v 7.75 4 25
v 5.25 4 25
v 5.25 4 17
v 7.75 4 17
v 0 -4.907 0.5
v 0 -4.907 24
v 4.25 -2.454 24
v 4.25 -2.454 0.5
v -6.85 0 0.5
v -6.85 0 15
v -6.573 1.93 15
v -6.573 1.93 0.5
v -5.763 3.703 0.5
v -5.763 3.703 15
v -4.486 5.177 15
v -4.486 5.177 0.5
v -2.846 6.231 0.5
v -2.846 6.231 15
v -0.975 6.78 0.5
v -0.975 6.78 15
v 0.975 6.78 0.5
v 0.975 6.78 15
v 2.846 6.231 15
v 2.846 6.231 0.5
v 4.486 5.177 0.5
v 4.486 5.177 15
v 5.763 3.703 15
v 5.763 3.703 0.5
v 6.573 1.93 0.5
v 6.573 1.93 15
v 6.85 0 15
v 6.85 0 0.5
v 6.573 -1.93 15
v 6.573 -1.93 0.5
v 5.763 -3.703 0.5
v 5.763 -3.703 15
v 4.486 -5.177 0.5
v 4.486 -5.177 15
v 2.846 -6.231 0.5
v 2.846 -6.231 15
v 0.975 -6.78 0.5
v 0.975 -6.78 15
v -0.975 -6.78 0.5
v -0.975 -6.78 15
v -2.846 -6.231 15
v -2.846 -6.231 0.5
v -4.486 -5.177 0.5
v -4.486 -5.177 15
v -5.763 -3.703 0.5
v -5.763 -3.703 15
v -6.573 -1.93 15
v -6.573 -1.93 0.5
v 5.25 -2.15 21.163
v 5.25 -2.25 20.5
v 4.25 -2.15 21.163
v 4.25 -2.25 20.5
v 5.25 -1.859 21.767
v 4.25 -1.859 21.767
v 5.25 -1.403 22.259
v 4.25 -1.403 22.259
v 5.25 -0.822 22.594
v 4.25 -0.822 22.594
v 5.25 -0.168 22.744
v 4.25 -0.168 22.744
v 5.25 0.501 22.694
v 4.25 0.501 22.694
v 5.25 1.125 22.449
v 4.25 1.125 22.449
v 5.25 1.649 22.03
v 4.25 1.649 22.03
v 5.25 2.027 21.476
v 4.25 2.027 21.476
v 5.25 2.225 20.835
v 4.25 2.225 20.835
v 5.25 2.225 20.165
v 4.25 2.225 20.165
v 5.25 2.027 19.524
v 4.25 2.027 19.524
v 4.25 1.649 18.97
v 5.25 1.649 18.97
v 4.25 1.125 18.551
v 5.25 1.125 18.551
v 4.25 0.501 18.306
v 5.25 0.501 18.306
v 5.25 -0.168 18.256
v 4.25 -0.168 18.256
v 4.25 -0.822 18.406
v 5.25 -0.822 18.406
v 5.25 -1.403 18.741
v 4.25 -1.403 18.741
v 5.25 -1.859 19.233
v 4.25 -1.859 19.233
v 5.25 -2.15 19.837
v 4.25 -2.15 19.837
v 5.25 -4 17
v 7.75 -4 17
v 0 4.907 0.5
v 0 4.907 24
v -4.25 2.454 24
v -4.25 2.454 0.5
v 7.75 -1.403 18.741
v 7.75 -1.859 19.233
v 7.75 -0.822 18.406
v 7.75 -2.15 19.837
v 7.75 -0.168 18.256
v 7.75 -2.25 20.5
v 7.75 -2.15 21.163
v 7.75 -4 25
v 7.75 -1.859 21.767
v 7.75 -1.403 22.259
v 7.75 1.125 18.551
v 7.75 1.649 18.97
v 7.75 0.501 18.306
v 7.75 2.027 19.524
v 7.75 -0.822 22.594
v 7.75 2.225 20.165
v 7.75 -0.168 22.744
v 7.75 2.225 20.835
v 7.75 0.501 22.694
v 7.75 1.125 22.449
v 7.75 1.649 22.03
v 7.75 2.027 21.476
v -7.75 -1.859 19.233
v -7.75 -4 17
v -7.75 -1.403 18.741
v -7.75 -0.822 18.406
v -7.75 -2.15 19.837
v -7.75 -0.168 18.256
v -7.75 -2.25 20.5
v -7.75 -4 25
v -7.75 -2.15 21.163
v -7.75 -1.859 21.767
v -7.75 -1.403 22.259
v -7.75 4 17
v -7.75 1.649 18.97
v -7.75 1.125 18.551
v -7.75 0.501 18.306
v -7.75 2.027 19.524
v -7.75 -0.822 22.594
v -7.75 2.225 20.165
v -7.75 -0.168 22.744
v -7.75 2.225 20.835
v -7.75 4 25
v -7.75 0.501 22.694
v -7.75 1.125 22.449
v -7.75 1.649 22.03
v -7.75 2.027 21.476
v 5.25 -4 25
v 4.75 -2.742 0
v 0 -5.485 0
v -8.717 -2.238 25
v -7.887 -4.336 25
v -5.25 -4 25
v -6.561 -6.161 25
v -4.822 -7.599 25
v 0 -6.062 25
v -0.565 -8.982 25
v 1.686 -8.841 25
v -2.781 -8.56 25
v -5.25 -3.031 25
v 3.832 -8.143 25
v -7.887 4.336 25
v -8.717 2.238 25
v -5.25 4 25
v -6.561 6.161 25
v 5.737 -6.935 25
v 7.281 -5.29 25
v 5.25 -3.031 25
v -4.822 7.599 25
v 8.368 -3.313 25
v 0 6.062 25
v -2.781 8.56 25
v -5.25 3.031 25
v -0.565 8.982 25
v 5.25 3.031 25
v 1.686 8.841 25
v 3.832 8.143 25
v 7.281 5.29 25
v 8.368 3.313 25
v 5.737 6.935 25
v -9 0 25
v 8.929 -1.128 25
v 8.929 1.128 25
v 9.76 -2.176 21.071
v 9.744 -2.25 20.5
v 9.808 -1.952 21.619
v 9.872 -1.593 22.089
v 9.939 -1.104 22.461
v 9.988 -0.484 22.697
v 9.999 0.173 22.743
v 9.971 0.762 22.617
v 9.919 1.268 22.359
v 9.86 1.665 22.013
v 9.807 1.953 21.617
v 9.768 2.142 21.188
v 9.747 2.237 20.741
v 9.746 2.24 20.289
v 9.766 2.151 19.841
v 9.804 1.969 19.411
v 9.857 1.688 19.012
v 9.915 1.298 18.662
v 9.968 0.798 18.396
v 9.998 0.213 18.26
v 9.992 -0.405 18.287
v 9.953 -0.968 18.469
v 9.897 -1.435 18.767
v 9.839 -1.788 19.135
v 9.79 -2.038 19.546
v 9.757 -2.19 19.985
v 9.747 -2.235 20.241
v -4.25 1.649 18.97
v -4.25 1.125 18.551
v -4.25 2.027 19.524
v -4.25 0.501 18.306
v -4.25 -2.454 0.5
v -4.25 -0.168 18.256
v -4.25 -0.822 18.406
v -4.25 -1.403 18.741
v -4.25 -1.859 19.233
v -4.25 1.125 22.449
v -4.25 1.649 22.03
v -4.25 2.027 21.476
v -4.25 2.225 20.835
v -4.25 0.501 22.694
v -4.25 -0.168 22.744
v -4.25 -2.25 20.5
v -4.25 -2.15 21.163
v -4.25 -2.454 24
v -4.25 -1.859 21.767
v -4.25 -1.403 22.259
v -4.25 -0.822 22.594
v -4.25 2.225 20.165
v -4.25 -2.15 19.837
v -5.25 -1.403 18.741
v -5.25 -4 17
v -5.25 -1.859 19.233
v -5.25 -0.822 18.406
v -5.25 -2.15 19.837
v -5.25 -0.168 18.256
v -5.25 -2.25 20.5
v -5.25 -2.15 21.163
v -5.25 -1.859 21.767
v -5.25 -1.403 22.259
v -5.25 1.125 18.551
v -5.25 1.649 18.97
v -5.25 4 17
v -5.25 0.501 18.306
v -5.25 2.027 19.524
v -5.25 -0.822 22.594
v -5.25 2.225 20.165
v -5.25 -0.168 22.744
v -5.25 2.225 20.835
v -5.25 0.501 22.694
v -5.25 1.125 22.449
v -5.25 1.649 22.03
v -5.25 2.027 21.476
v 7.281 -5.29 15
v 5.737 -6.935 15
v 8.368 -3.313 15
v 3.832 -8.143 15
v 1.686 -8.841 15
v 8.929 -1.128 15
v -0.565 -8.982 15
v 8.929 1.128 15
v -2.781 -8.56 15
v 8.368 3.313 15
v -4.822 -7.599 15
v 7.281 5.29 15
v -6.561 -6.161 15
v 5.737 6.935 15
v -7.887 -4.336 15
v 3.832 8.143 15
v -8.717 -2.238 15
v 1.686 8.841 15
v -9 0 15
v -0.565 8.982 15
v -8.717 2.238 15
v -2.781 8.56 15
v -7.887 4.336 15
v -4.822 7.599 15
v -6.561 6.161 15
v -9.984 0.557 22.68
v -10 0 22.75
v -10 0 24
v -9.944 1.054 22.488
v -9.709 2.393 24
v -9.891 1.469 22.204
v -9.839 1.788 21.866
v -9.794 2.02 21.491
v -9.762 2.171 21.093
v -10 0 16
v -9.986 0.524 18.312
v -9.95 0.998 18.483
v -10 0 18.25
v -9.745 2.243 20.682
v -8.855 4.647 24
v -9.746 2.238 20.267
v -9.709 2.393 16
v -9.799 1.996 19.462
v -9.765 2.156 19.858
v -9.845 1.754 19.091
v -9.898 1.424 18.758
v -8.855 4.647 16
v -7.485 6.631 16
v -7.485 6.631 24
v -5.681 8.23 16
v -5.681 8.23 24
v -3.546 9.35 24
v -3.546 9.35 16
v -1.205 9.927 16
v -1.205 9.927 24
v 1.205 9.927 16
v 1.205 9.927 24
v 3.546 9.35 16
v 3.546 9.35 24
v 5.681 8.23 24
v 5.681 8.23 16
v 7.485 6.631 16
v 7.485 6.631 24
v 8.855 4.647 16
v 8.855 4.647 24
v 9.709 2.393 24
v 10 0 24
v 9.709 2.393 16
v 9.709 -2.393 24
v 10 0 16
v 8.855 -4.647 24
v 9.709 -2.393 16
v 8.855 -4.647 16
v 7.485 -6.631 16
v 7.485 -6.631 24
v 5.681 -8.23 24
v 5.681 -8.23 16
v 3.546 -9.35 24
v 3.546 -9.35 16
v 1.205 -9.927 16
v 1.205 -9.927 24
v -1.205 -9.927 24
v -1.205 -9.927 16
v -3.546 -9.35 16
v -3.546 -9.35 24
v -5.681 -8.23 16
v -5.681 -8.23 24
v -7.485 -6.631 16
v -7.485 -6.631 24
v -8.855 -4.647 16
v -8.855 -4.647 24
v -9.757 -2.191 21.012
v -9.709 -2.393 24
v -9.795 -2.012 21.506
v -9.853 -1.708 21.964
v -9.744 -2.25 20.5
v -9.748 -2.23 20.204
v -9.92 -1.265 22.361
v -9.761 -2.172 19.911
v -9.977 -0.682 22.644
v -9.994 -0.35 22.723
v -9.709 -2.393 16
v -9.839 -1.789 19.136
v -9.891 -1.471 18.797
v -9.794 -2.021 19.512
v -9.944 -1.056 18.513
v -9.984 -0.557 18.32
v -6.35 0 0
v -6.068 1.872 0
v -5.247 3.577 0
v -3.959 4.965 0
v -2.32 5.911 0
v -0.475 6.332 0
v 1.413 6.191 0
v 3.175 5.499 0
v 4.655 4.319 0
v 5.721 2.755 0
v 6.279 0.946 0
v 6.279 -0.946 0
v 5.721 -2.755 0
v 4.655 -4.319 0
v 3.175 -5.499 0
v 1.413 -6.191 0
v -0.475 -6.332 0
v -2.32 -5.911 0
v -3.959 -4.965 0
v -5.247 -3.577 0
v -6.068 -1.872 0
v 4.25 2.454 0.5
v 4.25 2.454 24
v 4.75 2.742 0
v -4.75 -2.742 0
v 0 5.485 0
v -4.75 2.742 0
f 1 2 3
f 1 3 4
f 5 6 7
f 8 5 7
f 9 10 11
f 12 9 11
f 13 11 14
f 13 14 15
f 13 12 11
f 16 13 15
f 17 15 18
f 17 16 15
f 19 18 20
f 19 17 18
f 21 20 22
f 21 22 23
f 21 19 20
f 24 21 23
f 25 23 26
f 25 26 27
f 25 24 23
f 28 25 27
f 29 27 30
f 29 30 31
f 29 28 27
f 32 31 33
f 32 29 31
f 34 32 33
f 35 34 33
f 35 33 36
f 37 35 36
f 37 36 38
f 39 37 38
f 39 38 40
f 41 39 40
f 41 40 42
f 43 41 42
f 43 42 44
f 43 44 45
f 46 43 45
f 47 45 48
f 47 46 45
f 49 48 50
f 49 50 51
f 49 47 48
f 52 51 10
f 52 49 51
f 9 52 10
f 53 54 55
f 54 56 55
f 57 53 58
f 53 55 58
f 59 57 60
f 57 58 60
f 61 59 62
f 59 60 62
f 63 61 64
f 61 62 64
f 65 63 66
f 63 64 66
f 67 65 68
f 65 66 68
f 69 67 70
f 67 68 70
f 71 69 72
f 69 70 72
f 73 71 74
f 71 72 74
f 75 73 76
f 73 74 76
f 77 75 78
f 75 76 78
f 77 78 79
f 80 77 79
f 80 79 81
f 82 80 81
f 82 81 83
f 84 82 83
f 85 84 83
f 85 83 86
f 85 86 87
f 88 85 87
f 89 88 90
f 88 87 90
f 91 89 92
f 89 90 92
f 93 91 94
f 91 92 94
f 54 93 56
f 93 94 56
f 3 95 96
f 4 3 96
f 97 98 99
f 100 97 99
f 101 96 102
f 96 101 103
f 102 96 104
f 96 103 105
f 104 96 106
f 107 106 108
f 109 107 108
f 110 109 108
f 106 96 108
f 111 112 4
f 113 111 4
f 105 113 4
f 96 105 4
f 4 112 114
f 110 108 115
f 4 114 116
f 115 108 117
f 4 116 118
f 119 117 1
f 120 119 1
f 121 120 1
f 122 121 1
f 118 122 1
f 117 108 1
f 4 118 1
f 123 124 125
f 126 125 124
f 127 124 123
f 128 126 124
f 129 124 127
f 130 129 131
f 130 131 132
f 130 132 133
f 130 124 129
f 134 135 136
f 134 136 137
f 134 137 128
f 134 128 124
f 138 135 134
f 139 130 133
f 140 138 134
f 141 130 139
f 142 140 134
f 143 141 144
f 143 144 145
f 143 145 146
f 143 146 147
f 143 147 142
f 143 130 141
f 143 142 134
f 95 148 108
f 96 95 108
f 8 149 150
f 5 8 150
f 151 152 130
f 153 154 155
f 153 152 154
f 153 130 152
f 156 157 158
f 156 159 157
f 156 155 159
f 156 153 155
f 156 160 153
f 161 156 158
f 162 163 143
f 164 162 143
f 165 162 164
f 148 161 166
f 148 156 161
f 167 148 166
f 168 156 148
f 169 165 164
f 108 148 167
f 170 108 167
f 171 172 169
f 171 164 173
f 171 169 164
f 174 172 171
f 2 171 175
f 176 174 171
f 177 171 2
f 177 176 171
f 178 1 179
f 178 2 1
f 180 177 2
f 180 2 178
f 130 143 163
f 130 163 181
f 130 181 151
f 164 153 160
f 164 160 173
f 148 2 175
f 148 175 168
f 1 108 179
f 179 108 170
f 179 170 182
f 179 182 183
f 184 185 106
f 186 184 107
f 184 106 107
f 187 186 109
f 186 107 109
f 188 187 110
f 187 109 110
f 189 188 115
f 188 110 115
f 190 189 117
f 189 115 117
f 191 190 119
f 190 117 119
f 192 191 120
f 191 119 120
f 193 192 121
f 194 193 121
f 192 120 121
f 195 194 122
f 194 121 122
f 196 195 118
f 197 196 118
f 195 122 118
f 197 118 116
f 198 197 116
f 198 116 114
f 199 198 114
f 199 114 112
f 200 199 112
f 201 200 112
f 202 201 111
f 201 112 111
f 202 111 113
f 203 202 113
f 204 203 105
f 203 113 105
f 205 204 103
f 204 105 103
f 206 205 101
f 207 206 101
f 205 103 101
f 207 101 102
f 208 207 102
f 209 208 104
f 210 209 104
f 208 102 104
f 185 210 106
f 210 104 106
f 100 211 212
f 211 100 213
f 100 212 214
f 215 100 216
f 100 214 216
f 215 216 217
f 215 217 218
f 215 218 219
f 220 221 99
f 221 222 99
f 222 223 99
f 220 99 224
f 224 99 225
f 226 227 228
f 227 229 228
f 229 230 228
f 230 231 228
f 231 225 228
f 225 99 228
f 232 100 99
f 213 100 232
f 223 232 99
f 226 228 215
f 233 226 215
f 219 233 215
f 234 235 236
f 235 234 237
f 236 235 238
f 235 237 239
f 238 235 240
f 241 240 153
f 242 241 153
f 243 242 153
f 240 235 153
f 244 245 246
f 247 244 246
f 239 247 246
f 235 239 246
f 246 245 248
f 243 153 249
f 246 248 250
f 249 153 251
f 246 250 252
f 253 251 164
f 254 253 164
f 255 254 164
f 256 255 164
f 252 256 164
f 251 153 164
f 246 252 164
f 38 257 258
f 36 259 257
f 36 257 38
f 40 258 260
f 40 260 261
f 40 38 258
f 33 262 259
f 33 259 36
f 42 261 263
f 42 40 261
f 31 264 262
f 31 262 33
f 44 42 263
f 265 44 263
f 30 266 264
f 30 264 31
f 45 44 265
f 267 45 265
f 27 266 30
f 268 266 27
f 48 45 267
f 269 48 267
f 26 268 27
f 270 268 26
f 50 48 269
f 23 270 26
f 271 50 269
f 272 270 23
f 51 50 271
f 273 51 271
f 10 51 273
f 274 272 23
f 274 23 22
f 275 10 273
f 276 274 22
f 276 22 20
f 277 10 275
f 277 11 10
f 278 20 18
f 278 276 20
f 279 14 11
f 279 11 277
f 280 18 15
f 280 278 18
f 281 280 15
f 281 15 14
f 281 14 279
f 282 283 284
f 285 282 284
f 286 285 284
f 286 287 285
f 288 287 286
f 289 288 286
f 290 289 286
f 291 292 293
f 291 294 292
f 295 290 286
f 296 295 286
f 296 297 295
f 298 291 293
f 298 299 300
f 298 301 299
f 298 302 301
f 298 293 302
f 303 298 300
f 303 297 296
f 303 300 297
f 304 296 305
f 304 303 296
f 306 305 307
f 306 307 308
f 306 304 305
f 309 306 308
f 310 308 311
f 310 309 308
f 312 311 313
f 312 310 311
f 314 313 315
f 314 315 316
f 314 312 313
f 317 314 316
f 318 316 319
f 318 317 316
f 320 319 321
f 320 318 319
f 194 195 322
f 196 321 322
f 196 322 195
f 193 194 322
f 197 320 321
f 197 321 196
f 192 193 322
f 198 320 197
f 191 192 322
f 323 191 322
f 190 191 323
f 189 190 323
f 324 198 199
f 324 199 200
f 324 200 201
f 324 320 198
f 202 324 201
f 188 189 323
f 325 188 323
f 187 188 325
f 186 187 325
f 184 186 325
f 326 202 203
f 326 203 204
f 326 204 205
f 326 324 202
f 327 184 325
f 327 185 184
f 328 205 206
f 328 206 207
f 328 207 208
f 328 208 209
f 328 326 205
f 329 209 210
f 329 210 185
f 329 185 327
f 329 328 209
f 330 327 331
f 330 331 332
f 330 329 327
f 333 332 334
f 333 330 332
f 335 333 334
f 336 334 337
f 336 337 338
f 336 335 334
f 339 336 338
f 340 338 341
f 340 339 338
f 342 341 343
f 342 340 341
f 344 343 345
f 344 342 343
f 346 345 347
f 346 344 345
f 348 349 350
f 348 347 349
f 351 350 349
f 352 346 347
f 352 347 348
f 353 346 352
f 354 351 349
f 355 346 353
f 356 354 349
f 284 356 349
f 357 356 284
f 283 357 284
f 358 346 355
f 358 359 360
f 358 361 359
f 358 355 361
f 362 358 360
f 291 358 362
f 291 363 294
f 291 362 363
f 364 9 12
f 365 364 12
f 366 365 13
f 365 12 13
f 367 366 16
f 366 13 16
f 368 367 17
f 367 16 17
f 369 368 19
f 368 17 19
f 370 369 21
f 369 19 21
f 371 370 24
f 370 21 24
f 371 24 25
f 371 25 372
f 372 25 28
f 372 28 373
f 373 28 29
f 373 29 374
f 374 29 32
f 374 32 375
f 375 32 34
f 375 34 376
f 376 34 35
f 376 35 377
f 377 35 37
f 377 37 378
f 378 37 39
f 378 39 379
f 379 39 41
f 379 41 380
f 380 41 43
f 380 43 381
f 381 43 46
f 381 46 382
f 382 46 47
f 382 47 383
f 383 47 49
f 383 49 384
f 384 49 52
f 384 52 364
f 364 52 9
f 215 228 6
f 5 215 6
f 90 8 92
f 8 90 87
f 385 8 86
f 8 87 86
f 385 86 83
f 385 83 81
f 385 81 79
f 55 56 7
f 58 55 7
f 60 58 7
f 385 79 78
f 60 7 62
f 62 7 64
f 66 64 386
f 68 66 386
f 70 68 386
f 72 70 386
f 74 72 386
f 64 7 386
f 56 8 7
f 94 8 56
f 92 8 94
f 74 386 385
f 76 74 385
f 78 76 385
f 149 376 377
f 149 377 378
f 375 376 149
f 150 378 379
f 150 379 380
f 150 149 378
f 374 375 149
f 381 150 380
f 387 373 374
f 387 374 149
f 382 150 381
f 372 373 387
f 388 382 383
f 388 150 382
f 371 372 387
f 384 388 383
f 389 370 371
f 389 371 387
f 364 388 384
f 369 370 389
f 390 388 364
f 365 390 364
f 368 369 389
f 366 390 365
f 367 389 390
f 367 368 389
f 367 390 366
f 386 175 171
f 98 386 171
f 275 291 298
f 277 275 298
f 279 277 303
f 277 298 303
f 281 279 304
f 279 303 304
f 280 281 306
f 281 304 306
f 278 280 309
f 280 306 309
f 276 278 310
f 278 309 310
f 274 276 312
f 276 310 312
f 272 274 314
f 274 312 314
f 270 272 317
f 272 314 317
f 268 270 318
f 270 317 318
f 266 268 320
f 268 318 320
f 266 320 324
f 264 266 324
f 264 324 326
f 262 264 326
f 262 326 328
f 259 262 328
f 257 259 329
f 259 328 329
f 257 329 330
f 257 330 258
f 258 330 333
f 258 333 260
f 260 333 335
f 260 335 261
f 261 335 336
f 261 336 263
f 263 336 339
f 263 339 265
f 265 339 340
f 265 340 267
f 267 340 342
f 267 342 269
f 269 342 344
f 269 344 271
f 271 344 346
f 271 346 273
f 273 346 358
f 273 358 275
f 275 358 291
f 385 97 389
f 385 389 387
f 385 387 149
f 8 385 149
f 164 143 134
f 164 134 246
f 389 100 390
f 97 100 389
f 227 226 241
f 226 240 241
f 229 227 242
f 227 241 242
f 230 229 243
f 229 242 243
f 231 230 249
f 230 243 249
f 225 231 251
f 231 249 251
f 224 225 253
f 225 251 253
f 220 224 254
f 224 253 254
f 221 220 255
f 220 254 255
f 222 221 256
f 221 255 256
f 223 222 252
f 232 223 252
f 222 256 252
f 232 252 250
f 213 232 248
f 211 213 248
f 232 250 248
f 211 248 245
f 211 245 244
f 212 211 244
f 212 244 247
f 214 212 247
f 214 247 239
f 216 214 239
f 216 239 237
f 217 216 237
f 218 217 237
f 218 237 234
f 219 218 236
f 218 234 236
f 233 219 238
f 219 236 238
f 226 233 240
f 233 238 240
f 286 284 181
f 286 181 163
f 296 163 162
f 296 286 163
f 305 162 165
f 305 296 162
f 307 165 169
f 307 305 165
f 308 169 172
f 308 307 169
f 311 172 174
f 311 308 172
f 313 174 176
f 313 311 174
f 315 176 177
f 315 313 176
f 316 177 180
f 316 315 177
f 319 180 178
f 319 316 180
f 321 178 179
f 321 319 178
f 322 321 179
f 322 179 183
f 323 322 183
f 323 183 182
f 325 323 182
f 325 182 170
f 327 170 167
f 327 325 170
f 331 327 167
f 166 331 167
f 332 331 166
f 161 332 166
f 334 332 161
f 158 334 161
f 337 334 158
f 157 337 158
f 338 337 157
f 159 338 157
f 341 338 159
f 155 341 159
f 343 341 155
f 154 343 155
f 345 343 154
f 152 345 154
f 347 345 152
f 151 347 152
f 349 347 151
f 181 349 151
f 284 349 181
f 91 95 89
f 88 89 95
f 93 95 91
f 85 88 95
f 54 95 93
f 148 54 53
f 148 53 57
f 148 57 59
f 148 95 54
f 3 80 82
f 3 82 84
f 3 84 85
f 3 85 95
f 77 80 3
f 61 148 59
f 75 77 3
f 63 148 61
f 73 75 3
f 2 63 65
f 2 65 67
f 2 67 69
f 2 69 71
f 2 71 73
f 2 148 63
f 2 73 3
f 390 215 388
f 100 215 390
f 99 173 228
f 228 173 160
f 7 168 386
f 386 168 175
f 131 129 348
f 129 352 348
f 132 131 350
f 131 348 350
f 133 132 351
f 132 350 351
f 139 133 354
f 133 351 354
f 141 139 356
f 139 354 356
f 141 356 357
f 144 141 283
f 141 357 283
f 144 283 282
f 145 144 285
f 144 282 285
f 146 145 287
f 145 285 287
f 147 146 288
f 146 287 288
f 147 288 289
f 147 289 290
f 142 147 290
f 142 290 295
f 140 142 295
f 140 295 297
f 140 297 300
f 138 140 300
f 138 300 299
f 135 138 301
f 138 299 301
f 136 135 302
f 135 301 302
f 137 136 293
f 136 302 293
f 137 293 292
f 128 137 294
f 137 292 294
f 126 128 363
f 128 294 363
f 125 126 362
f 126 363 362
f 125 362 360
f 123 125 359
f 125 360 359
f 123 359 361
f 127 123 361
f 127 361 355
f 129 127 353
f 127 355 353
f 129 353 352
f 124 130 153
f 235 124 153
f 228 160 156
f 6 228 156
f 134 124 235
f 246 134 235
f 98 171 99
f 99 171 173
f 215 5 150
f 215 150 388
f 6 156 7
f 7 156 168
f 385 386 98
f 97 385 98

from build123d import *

# Parameters (mm, degrees)
F3_DEPTH = 25.001
F2_W     = 2.5
F2_H     = 8
F4_DEPTH = 8
F5_R     = 2.25
F6_DEPTH = 25
F7_SIZE  = 0.99999
F8_SIZE  = 0.5


# Not quite as in the source:
# - a fillet or chamfer is up to 0.001 mm smaller than in the source, because OpenCascade refuses the exact size


with BuildPart() as f1:
    # F0 (on Front) → F1 (revolve)
    with BuildSketch(Plane.XZ):
        Polygon((-6.85, 0), (0, 0), (0, 25), (-10, 25), (-10, 15), (-6.85, 15), align=None)
    revolve(axis=Axis((0, 0, 12.5), (0, 0, -1)))

    # F2 (on face) → F3 (cut, through all)
    with BuildSketch(Plane.XY.offset(25)):
        Polygon((4.25, -2.4537386441), (4.25, 2.4537386441), (0, 4.9074772881), (-4.25, 2.4537386441), (-4.25, -2.4537386441), (0, -4.9074772881), align=None)
    extrude(amount=-F3_DEPTH, mode=Mode.SUBTRACT)

    # F2 (on face) → F4 (cut)
    with BuildSketch(Plane.XY.offset(25)):
        with Locations((-6.5, 0)):
            Rectangle(F2_W, F2_H)
        with Locations((6.5, 0)):
            Rectangle(F2_W, F2_H)
    extrude(amount=-F4_DEPTH, mode=Mode.SUBTRACT)

    # F5 (on face) → F6 (cut, symmetric)
    with BuildSketch(Plane(origin=(-5.25, 0, 0), x_dir=(0, -1, 0), z_dir=(-1, 0, 0))):
        with Locations((0, 20.5)):
            Circle(F5_R)
    extrude(amount=F6_DEPTH, both=True, mode=Mode.SUBTRACT)

    # F7 (size 1 in the source; OpenCascade refuses exactly that, so slightly less here)
    f7_edges = [f1.edges().sort_by_distance(p)[0] for p in [
        (10, 0, 25),
        (10, 0, 15),
        (-2.125, 3.680608, 25),
        (2.125, 3.680608, 25),
        (4.25, 0, 25),
        (2.125, -3.680608, 25),
        (-2.125, -3.680608, 25),
        (-4.25, 0, 25),
    ]]
    chamfer(f7_edges, length=F7_SIZE)

    # F8
    f8_edges = [f1.edges().sort_by_distance(p)[0] for p in [
        (6.85, 0, 0),
        (4.25, 0, 0),
        (2.125, -3.680608, 0),
        (-2.125, -3.680608, 0),
        (-4.25, 0, 0),
        (-2.125, 3.680608, 0),
        (2.125, 3.680608, 0),
    ]]
    chamfer(f8_edges, length=F8_SIZE)


solid = f1.part
